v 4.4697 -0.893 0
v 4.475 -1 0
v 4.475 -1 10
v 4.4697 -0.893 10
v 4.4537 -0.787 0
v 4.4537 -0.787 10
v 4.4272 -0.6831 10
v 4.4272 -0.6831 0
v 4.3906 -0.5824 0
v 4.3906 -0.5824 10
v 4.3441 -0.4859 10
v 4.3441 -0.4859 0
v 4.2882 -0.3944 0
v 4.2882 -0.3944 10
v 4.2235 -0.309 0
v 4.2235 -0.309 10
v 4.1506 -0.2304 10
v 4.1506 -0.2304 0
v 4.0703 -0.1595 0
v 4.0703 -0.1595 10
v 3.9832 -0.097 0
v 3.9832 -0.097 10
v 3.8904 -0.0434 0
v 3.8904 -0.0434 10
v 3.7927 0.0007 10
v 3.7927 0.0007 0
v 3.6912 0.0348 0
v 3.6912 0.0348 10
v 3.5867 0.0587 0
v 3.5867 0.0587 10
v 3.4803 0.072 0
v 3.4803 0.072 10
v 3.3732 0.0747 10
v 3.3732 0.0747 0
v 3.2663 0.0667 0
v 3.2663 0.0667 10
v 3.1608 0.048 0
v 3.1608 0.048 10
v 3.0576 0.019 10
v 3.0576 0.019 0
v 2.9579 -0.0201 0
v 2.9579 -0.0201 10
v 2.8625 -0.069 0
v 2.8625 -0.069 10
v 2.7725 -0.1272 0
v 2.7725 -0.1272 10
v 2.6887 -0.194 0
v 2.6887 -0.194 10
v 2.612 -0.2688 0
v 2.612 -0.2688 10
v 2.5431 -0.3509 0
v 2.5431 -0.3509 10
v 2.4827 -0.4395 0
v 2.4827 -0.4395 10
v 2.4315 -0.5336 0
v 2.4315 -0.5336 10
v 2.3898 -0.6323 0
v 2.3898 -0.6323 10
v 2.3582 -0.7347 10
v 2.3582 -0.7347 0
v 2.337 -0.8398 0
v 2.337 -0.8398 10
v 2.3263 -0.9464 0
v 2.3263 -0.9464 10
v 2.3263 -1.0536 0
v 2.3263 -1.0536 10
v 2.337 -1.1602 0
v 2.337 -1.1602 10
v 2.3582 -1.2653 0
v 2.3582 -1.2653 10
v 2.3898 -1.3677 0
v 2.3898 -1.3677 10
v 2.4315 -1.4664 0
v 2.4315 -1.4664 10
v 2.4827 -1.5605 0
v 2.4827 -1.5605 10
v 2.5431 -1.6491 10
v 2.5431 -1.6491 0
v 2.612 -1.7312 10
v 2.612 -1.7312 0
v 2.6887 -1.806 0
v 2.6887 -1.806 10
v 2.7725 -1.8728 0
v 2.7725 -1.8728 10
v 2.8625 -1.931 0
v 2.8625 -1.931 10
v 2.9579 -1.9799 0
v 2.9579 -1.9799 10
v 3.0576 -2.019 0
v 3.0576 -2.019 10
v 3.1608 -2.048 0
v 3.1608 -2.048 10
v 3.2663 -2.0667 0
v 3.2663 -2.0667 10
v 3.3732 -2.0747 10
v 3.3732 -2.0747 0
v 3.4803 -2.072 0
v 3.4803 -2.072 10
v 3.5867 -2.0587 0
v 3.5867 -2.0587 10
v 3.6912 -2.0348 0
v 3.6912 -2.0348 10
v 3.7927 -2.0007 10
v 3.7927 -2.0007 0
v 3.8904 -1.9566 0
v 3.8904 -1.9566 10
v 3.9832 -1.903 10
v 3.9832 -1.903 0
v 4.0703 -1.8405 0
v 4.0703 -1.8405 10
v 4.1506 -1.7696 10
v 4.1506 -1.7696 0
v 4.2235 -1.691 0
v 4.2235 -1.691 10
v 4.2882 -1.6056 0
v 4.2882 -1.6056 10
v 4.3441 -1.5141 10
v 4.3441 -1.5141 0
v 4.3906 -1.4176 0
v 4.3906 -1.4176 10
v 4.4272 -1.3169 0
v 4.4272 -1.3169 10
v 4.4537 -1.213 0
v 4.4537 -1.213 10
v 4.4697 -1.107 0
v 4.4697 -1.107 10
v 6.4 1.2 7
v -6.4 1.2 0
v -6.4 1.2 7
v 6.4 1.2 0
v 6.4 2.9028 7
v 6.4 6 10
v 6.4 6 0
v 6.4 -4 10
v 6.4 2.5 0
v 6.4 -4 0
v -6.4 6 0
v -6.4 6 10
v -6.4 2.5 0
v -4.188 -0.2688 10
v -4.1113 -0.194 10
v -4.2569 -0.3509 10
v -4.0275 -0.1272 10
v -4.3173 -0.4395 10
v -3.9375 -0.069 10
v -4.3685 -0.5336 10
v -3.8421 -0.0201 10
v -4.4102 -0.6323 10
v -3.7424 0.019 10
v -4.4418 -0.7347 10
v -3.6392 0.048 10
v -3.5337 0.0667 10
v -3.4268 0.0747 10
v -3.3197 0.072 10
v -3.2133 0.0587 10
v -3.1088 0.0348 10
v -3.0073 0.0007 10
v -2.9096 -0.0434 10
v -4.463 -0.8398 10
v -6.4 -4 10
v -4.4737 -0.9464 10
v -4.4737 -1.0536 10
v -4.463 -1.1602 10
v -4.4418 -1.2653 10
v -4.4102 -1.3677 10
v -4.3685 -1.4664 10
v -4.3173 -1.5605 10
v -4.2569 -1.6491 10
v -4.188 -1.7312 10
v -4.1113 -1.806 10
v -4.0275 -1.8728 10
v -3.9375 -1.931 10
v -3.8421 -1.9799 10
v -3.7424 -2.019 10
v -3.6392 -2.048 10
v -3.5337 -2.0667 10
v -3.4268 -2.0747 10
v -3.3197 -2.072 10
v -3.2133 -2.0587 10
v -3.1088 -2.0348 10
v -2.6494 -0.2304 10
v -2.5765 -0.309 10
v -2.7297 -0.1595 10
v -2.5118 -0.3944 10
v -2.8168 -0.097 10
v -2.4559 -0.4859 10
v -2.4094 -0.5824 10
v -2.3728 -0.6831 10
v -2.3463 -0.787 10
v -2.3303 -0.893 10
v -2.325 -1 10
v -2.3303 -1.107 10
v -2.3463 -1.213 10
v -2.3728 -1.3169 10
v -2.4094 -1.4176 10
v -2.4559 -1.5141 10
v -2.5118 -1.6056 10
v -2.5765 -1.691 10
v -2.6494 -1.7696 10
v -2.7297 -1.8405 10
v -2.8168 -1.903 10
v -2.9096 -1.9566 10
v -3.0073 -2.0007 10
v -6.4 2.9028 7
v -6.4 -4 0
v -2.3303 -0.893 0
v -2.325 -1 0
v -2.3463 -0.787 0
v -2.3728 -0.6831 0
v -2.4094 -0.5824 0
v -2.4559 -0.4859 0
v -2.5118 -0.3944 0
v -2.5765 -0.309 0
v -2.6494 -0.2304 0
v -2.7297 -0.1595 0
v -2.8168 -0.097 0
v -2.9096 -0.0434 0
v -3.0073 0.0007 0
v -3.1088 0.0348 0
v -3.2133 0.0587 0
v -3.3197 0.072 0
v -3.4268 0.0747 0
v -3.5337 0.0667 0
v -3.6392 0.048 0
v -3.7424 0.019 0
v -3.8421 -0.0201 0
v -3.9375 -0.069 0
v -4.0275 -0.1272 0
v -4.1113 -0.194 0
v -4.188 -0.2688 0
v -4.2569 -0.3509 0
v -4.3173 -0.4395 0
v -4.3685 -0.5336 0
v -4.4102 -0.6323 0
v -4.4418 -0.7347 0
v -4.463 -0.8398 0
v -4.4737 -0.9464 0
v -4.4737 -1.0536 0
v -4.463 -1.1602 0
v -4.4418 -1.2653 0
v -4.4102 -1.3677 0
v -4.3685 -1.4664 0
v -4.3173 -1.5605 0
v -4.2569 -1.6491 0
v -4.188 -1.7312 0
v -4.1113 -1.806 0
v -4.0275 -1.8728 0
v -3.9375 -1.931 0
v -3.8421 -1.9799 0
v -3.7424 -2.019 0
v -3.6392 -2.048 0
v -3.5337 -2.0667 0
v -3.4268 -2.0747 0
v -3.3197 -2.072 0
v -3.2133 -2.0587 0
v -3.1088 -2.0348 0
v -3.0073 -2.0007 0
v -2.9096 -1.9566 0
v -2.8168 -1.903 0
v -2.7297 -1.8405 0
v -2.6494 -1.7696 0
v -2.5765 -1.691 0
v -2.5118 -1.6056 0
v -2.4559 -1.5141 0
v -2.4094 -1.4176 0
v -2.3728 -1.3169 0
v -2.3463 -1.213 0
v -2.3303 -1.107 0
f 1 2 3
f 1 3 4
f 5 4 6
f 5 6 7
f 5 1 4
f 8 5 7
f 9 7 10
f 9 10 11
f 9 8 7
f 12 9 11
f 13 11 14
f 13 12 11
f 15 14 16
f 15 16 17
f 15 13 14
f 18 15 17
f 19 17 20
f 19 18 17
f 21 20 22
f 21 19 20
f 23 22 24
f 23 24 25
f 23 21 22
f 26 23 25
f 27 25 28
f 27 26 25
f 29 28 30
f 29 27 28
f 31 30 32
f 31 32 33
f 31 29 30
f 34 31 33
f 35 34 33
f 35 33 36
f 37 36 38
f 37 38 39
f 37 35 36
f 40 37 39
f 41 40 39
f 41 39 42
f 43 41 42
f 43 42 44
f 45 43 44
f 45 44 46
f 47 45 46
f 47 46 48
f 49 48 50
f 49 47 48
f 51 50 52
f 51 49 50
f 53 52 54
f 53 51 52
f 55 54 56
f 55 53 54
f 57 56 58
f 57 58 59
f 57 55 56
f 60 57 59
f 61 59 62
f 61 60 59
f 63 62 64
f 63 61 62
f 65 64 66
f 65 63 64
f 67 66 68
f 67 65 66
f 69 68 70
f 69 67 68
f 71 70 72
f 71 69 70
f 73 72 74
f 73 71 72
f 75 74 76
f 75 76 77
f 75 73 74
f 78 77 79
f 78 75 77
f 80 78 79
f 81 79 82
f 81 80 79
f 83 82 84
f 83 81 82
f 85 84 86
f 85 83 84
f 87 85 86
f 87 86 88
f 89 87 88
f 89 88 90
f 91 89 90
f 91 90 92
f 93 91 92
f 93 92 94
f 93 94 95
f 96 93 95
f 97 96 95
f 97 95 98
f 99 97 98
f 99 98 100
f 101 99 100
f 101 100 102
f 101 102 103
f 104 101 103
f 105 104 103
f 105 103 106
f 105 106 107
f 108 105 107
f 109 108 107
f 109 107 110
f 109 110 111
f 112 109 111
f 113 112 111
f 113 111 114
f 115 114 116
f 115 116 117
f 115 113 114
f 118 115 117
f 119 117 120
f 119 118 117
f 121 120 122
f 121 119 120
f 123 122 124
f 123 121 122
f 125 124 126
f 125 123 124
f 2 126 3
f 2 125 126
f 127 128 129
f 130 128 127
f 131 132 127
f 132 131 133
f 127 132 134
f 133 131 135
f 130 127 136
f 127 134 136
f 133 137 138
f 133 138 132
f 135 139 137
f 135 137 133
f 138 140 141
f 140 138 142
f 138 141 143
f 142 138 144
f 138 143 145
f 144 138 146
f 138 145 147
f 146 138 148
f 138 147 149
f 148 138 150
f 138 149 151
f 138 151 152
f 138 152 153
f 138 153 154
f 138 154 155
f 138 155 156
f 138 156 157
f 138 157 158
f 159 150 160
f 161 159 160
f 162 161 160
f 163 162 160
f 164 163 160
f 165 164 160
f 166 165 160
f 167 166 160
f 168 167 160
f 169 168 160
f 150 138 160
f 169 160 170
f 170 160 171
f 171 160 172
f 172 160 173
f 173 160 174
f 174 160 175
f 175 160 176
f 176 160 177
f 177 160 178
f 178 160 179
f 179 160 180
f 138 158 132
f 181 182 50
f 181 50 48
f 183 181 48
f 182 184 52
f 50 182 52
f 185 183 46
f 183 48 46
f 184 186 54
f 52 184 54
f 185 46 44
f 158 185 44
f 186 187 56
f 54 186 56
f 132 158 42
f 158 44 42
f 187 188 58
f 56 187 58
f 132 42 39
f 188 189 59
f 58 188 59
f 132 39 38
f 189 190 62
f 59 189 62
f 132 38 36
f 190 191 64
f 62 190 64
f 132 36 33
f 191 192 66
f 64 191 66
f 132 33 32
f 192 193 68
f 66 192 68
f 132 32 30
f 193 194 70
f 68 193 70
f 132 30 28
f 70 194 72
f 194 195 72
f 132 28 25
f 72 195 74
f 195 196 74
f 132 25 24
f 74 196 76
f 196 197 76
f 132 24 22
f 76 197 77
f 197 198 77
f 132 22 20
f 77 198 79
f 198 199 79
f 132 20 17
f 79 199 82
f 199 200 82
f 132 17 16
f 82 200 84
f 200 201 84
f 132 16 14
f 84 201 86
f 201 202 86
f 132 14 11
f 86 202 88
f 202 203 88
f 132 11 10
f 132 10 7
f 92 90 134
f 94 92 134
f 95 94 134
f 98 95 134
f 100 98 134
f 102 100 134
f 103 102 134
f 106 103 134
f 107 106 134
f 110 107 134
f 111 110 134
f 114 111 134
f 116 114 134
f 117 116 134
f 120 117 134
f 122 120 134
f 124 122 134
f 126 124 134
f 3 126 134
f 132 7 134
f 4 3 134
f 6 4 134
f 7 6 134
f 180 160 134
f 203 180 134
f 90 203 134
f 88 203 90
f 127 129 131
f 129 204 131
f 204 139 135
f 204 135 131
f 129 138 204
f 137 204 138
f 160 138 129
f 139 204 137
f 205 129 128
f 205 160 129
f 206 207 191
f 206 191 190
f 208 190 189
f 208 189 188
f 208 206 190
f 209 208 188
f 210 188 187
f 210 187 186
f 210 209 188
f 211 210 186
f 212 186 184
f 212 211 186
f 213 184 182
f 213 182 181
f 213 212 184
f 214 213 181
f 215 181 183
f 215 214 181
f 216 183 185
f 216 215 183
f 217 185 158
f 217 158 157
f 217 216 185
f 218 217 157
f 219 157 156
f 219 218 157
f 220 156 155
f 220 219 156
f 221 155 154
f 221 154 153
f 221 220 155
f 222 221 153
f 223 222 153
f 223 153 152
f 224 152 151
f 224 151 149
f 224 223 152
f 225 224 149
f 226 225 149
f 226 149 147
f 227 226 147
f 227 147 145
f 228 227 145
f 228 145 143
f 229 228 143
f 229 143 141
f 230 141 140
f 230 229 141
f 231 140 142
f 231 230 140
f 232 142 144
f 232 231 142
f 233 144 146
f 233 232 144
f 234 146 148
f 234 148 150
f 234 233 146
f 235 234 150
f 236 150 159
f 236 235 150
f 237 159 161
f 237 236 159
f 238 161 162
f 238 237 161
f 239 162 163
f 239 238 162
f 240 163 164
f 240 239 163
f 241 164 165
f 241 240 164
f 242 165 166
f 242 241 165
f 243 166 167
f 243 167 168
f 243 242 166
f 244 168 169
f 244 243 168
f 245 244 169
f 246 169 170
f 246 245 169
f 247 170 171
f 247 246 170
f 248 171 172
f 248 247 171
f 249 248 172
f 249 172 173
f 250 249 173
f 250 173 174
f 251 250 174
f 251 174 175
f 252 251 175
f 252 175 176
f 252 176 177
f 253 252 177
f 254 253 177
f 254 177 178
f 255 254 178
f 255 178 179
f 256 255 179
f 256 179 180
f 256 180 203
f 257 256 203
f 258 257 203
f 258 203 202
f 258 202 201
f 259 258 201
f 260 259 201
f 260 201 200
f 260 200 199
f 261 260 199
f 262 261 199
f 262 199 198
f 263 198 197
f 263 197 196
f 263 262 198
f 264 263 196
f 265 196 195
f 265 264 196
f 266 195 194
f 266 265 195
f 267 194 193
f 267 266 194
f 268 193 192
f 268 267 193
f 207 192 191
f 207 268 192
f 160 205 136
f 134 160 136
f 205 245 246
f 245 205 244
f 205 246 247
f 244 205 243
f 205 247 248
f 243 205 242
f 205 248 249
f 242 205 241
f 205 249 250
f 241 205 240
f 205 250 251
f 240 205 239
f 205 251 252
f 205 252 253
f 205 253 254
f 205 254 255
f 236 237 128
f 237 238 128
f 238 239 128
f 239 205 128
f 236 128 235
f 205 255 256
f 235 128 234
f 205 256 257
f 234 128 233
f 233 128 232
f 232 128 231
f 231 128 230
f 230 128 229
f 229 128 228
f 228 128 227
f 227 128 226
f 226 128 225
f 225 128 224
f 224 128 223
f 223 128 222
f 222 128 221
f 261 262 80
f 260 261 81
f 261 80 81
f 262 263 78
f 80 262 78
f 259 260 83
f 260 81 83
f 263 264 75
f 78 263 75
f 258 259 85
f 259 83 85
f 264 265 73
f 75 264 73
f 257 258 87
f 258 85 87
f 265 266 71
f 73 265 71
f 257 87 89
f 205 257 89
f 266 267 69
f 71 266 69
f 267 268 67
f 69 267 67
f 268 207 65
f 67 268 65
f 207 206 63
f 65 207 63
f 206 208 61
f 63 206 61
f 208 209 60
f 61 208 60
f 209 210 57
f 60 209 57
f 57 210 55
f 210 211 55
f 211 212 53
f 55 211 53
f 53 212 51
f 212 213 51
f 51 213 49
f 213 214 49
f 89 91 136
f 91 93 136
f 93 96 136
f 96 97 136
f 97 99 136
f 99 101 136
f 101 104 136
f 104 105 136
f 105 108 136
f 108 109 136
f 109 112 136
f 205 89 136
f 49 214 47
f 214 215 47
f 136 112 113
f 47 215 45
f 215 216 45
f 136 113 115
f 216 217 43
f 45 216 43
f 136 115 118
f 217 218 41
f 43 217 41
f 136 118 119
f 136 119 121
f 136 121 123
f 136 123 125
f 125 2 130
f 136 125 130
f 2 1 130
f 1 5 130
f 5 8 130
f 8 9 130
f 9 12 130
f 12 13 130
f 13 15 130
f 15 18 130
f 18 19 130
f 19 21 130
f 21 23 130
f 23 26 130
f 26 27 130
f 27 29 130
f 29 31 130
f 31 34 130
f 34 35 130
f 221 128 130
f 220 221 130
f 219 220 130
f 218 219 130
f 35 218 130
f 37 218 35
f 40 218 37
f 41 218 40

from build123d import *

# Parameters (mm, degrees)
BOSS_EXTRUDE1_DEPTH = 10
SKETCH1_3_W         = 12.8
SKETCH1_3_H         = 1.3
BOSS_EXTRUDE2_DEPTH = 7
SKETCH1_5_W         = 12.8
SKETCH1_5_H         = 1.3
CUT_EXTRUDE1_DEPTH  = 7
SKETCH1_6_R         = 1.075
CUT_EXTRUDE2_DEPTH  = 10
SKETCH4_W           = 12.8
SKETCH4_H           = 10
BOSS_EXTRUDE3_DEPTH = 1
CUT_EXTRUDE3_DEPTH  = 15
SKETCH8_W           = 12.8
SKETCH8_H           = 10
BOSS_EXTRUDE4_DEPTH = 1


with BuildPart() as part:
    # Sketch1 → Boss-Extrude1 (new body)
    with BuildSketch(Plane.XY):
        Polygon((6.4, 4), (-6.4, 4), (-6.4, -1), (-6.4, -4), (6.4, -4), (6.4, -1), align=None)
    extrude(amount=BOSS_EXTRUDE1_DEPTH)

    # Sketch1<3> → Boss-Extrude2 (add)
    with BuildSketch(Plane.XY):
        with Locations((0, 1.85)):
            Rectangle(SKETCH1_3_W, SKETCH1_3_H)
    extrude(amount=BOSS_EXTRUDE2_DEPTH)

    # Sketch1<5> → Cut-Extrude1 (cut)
    with BuildSketch(Plane.XY):
        with Locations((0, 1.85)):
            Rectangle(SKETCH1_5_W, SKETCH1_5_H)
    extrude(amount=CUT_EXTRUDE1_DEPTH, mode=Mode.SUBTRACT)

    # Sketch1<6> → Cut-Extrude2 (cut)
    with BuildSketch(Plane.XY):
        with Locations((3.4, -1)):
            Circle(SKETCH1_6_R)
        with Locations((-3.4, -1)):
            Circle(SKETCH1_6_R)
    extrude(amount=CUT_EXTRUDE2_DEPTH, mode=Mode.SUBTRACT)

    # Sketch4 → Boss-Extrude3 (add)
    with BuildSketch(Plane(origin=(0, 4, 0), x_dir=(1, 0, 0), z_dir=(0, 1, 0))):
        with Locations((0, -5)):
            Rectangle(SKETCH4_W, SKETCH4_H)
    extrude(amount=BOSS_EXTRUDE3_DEPTH)

    # Sketch6 → Cut-Extrude3 (cut)
    with BuildSketch(Plane(origin=(6.4, 0, 0), x_dir=(0, 0, -1), z_dir=(1, 0, 0))):
        Polygon((0, 2.5), (-7, 2.902751688), (-7, 2.5), align=None)
    extrude(amount=-CUT_EXTRUDE3_DEPTH, mode=Mode.SUBTRACT)

    # Sketch8 → Boss-Extrude4 (add)
    with BuildSketch(Plane(origin=(0, 5, 0), x_dir=(1, 0, 0), z_dir=(0, 1, 0))):
        with Locations((0, -5)):
            Rectangle(SKETCH8_W, SKETCH8_H)
    extrude(amount=BOSS_EXTRUDE4_DEPTH)


solid = part.part
